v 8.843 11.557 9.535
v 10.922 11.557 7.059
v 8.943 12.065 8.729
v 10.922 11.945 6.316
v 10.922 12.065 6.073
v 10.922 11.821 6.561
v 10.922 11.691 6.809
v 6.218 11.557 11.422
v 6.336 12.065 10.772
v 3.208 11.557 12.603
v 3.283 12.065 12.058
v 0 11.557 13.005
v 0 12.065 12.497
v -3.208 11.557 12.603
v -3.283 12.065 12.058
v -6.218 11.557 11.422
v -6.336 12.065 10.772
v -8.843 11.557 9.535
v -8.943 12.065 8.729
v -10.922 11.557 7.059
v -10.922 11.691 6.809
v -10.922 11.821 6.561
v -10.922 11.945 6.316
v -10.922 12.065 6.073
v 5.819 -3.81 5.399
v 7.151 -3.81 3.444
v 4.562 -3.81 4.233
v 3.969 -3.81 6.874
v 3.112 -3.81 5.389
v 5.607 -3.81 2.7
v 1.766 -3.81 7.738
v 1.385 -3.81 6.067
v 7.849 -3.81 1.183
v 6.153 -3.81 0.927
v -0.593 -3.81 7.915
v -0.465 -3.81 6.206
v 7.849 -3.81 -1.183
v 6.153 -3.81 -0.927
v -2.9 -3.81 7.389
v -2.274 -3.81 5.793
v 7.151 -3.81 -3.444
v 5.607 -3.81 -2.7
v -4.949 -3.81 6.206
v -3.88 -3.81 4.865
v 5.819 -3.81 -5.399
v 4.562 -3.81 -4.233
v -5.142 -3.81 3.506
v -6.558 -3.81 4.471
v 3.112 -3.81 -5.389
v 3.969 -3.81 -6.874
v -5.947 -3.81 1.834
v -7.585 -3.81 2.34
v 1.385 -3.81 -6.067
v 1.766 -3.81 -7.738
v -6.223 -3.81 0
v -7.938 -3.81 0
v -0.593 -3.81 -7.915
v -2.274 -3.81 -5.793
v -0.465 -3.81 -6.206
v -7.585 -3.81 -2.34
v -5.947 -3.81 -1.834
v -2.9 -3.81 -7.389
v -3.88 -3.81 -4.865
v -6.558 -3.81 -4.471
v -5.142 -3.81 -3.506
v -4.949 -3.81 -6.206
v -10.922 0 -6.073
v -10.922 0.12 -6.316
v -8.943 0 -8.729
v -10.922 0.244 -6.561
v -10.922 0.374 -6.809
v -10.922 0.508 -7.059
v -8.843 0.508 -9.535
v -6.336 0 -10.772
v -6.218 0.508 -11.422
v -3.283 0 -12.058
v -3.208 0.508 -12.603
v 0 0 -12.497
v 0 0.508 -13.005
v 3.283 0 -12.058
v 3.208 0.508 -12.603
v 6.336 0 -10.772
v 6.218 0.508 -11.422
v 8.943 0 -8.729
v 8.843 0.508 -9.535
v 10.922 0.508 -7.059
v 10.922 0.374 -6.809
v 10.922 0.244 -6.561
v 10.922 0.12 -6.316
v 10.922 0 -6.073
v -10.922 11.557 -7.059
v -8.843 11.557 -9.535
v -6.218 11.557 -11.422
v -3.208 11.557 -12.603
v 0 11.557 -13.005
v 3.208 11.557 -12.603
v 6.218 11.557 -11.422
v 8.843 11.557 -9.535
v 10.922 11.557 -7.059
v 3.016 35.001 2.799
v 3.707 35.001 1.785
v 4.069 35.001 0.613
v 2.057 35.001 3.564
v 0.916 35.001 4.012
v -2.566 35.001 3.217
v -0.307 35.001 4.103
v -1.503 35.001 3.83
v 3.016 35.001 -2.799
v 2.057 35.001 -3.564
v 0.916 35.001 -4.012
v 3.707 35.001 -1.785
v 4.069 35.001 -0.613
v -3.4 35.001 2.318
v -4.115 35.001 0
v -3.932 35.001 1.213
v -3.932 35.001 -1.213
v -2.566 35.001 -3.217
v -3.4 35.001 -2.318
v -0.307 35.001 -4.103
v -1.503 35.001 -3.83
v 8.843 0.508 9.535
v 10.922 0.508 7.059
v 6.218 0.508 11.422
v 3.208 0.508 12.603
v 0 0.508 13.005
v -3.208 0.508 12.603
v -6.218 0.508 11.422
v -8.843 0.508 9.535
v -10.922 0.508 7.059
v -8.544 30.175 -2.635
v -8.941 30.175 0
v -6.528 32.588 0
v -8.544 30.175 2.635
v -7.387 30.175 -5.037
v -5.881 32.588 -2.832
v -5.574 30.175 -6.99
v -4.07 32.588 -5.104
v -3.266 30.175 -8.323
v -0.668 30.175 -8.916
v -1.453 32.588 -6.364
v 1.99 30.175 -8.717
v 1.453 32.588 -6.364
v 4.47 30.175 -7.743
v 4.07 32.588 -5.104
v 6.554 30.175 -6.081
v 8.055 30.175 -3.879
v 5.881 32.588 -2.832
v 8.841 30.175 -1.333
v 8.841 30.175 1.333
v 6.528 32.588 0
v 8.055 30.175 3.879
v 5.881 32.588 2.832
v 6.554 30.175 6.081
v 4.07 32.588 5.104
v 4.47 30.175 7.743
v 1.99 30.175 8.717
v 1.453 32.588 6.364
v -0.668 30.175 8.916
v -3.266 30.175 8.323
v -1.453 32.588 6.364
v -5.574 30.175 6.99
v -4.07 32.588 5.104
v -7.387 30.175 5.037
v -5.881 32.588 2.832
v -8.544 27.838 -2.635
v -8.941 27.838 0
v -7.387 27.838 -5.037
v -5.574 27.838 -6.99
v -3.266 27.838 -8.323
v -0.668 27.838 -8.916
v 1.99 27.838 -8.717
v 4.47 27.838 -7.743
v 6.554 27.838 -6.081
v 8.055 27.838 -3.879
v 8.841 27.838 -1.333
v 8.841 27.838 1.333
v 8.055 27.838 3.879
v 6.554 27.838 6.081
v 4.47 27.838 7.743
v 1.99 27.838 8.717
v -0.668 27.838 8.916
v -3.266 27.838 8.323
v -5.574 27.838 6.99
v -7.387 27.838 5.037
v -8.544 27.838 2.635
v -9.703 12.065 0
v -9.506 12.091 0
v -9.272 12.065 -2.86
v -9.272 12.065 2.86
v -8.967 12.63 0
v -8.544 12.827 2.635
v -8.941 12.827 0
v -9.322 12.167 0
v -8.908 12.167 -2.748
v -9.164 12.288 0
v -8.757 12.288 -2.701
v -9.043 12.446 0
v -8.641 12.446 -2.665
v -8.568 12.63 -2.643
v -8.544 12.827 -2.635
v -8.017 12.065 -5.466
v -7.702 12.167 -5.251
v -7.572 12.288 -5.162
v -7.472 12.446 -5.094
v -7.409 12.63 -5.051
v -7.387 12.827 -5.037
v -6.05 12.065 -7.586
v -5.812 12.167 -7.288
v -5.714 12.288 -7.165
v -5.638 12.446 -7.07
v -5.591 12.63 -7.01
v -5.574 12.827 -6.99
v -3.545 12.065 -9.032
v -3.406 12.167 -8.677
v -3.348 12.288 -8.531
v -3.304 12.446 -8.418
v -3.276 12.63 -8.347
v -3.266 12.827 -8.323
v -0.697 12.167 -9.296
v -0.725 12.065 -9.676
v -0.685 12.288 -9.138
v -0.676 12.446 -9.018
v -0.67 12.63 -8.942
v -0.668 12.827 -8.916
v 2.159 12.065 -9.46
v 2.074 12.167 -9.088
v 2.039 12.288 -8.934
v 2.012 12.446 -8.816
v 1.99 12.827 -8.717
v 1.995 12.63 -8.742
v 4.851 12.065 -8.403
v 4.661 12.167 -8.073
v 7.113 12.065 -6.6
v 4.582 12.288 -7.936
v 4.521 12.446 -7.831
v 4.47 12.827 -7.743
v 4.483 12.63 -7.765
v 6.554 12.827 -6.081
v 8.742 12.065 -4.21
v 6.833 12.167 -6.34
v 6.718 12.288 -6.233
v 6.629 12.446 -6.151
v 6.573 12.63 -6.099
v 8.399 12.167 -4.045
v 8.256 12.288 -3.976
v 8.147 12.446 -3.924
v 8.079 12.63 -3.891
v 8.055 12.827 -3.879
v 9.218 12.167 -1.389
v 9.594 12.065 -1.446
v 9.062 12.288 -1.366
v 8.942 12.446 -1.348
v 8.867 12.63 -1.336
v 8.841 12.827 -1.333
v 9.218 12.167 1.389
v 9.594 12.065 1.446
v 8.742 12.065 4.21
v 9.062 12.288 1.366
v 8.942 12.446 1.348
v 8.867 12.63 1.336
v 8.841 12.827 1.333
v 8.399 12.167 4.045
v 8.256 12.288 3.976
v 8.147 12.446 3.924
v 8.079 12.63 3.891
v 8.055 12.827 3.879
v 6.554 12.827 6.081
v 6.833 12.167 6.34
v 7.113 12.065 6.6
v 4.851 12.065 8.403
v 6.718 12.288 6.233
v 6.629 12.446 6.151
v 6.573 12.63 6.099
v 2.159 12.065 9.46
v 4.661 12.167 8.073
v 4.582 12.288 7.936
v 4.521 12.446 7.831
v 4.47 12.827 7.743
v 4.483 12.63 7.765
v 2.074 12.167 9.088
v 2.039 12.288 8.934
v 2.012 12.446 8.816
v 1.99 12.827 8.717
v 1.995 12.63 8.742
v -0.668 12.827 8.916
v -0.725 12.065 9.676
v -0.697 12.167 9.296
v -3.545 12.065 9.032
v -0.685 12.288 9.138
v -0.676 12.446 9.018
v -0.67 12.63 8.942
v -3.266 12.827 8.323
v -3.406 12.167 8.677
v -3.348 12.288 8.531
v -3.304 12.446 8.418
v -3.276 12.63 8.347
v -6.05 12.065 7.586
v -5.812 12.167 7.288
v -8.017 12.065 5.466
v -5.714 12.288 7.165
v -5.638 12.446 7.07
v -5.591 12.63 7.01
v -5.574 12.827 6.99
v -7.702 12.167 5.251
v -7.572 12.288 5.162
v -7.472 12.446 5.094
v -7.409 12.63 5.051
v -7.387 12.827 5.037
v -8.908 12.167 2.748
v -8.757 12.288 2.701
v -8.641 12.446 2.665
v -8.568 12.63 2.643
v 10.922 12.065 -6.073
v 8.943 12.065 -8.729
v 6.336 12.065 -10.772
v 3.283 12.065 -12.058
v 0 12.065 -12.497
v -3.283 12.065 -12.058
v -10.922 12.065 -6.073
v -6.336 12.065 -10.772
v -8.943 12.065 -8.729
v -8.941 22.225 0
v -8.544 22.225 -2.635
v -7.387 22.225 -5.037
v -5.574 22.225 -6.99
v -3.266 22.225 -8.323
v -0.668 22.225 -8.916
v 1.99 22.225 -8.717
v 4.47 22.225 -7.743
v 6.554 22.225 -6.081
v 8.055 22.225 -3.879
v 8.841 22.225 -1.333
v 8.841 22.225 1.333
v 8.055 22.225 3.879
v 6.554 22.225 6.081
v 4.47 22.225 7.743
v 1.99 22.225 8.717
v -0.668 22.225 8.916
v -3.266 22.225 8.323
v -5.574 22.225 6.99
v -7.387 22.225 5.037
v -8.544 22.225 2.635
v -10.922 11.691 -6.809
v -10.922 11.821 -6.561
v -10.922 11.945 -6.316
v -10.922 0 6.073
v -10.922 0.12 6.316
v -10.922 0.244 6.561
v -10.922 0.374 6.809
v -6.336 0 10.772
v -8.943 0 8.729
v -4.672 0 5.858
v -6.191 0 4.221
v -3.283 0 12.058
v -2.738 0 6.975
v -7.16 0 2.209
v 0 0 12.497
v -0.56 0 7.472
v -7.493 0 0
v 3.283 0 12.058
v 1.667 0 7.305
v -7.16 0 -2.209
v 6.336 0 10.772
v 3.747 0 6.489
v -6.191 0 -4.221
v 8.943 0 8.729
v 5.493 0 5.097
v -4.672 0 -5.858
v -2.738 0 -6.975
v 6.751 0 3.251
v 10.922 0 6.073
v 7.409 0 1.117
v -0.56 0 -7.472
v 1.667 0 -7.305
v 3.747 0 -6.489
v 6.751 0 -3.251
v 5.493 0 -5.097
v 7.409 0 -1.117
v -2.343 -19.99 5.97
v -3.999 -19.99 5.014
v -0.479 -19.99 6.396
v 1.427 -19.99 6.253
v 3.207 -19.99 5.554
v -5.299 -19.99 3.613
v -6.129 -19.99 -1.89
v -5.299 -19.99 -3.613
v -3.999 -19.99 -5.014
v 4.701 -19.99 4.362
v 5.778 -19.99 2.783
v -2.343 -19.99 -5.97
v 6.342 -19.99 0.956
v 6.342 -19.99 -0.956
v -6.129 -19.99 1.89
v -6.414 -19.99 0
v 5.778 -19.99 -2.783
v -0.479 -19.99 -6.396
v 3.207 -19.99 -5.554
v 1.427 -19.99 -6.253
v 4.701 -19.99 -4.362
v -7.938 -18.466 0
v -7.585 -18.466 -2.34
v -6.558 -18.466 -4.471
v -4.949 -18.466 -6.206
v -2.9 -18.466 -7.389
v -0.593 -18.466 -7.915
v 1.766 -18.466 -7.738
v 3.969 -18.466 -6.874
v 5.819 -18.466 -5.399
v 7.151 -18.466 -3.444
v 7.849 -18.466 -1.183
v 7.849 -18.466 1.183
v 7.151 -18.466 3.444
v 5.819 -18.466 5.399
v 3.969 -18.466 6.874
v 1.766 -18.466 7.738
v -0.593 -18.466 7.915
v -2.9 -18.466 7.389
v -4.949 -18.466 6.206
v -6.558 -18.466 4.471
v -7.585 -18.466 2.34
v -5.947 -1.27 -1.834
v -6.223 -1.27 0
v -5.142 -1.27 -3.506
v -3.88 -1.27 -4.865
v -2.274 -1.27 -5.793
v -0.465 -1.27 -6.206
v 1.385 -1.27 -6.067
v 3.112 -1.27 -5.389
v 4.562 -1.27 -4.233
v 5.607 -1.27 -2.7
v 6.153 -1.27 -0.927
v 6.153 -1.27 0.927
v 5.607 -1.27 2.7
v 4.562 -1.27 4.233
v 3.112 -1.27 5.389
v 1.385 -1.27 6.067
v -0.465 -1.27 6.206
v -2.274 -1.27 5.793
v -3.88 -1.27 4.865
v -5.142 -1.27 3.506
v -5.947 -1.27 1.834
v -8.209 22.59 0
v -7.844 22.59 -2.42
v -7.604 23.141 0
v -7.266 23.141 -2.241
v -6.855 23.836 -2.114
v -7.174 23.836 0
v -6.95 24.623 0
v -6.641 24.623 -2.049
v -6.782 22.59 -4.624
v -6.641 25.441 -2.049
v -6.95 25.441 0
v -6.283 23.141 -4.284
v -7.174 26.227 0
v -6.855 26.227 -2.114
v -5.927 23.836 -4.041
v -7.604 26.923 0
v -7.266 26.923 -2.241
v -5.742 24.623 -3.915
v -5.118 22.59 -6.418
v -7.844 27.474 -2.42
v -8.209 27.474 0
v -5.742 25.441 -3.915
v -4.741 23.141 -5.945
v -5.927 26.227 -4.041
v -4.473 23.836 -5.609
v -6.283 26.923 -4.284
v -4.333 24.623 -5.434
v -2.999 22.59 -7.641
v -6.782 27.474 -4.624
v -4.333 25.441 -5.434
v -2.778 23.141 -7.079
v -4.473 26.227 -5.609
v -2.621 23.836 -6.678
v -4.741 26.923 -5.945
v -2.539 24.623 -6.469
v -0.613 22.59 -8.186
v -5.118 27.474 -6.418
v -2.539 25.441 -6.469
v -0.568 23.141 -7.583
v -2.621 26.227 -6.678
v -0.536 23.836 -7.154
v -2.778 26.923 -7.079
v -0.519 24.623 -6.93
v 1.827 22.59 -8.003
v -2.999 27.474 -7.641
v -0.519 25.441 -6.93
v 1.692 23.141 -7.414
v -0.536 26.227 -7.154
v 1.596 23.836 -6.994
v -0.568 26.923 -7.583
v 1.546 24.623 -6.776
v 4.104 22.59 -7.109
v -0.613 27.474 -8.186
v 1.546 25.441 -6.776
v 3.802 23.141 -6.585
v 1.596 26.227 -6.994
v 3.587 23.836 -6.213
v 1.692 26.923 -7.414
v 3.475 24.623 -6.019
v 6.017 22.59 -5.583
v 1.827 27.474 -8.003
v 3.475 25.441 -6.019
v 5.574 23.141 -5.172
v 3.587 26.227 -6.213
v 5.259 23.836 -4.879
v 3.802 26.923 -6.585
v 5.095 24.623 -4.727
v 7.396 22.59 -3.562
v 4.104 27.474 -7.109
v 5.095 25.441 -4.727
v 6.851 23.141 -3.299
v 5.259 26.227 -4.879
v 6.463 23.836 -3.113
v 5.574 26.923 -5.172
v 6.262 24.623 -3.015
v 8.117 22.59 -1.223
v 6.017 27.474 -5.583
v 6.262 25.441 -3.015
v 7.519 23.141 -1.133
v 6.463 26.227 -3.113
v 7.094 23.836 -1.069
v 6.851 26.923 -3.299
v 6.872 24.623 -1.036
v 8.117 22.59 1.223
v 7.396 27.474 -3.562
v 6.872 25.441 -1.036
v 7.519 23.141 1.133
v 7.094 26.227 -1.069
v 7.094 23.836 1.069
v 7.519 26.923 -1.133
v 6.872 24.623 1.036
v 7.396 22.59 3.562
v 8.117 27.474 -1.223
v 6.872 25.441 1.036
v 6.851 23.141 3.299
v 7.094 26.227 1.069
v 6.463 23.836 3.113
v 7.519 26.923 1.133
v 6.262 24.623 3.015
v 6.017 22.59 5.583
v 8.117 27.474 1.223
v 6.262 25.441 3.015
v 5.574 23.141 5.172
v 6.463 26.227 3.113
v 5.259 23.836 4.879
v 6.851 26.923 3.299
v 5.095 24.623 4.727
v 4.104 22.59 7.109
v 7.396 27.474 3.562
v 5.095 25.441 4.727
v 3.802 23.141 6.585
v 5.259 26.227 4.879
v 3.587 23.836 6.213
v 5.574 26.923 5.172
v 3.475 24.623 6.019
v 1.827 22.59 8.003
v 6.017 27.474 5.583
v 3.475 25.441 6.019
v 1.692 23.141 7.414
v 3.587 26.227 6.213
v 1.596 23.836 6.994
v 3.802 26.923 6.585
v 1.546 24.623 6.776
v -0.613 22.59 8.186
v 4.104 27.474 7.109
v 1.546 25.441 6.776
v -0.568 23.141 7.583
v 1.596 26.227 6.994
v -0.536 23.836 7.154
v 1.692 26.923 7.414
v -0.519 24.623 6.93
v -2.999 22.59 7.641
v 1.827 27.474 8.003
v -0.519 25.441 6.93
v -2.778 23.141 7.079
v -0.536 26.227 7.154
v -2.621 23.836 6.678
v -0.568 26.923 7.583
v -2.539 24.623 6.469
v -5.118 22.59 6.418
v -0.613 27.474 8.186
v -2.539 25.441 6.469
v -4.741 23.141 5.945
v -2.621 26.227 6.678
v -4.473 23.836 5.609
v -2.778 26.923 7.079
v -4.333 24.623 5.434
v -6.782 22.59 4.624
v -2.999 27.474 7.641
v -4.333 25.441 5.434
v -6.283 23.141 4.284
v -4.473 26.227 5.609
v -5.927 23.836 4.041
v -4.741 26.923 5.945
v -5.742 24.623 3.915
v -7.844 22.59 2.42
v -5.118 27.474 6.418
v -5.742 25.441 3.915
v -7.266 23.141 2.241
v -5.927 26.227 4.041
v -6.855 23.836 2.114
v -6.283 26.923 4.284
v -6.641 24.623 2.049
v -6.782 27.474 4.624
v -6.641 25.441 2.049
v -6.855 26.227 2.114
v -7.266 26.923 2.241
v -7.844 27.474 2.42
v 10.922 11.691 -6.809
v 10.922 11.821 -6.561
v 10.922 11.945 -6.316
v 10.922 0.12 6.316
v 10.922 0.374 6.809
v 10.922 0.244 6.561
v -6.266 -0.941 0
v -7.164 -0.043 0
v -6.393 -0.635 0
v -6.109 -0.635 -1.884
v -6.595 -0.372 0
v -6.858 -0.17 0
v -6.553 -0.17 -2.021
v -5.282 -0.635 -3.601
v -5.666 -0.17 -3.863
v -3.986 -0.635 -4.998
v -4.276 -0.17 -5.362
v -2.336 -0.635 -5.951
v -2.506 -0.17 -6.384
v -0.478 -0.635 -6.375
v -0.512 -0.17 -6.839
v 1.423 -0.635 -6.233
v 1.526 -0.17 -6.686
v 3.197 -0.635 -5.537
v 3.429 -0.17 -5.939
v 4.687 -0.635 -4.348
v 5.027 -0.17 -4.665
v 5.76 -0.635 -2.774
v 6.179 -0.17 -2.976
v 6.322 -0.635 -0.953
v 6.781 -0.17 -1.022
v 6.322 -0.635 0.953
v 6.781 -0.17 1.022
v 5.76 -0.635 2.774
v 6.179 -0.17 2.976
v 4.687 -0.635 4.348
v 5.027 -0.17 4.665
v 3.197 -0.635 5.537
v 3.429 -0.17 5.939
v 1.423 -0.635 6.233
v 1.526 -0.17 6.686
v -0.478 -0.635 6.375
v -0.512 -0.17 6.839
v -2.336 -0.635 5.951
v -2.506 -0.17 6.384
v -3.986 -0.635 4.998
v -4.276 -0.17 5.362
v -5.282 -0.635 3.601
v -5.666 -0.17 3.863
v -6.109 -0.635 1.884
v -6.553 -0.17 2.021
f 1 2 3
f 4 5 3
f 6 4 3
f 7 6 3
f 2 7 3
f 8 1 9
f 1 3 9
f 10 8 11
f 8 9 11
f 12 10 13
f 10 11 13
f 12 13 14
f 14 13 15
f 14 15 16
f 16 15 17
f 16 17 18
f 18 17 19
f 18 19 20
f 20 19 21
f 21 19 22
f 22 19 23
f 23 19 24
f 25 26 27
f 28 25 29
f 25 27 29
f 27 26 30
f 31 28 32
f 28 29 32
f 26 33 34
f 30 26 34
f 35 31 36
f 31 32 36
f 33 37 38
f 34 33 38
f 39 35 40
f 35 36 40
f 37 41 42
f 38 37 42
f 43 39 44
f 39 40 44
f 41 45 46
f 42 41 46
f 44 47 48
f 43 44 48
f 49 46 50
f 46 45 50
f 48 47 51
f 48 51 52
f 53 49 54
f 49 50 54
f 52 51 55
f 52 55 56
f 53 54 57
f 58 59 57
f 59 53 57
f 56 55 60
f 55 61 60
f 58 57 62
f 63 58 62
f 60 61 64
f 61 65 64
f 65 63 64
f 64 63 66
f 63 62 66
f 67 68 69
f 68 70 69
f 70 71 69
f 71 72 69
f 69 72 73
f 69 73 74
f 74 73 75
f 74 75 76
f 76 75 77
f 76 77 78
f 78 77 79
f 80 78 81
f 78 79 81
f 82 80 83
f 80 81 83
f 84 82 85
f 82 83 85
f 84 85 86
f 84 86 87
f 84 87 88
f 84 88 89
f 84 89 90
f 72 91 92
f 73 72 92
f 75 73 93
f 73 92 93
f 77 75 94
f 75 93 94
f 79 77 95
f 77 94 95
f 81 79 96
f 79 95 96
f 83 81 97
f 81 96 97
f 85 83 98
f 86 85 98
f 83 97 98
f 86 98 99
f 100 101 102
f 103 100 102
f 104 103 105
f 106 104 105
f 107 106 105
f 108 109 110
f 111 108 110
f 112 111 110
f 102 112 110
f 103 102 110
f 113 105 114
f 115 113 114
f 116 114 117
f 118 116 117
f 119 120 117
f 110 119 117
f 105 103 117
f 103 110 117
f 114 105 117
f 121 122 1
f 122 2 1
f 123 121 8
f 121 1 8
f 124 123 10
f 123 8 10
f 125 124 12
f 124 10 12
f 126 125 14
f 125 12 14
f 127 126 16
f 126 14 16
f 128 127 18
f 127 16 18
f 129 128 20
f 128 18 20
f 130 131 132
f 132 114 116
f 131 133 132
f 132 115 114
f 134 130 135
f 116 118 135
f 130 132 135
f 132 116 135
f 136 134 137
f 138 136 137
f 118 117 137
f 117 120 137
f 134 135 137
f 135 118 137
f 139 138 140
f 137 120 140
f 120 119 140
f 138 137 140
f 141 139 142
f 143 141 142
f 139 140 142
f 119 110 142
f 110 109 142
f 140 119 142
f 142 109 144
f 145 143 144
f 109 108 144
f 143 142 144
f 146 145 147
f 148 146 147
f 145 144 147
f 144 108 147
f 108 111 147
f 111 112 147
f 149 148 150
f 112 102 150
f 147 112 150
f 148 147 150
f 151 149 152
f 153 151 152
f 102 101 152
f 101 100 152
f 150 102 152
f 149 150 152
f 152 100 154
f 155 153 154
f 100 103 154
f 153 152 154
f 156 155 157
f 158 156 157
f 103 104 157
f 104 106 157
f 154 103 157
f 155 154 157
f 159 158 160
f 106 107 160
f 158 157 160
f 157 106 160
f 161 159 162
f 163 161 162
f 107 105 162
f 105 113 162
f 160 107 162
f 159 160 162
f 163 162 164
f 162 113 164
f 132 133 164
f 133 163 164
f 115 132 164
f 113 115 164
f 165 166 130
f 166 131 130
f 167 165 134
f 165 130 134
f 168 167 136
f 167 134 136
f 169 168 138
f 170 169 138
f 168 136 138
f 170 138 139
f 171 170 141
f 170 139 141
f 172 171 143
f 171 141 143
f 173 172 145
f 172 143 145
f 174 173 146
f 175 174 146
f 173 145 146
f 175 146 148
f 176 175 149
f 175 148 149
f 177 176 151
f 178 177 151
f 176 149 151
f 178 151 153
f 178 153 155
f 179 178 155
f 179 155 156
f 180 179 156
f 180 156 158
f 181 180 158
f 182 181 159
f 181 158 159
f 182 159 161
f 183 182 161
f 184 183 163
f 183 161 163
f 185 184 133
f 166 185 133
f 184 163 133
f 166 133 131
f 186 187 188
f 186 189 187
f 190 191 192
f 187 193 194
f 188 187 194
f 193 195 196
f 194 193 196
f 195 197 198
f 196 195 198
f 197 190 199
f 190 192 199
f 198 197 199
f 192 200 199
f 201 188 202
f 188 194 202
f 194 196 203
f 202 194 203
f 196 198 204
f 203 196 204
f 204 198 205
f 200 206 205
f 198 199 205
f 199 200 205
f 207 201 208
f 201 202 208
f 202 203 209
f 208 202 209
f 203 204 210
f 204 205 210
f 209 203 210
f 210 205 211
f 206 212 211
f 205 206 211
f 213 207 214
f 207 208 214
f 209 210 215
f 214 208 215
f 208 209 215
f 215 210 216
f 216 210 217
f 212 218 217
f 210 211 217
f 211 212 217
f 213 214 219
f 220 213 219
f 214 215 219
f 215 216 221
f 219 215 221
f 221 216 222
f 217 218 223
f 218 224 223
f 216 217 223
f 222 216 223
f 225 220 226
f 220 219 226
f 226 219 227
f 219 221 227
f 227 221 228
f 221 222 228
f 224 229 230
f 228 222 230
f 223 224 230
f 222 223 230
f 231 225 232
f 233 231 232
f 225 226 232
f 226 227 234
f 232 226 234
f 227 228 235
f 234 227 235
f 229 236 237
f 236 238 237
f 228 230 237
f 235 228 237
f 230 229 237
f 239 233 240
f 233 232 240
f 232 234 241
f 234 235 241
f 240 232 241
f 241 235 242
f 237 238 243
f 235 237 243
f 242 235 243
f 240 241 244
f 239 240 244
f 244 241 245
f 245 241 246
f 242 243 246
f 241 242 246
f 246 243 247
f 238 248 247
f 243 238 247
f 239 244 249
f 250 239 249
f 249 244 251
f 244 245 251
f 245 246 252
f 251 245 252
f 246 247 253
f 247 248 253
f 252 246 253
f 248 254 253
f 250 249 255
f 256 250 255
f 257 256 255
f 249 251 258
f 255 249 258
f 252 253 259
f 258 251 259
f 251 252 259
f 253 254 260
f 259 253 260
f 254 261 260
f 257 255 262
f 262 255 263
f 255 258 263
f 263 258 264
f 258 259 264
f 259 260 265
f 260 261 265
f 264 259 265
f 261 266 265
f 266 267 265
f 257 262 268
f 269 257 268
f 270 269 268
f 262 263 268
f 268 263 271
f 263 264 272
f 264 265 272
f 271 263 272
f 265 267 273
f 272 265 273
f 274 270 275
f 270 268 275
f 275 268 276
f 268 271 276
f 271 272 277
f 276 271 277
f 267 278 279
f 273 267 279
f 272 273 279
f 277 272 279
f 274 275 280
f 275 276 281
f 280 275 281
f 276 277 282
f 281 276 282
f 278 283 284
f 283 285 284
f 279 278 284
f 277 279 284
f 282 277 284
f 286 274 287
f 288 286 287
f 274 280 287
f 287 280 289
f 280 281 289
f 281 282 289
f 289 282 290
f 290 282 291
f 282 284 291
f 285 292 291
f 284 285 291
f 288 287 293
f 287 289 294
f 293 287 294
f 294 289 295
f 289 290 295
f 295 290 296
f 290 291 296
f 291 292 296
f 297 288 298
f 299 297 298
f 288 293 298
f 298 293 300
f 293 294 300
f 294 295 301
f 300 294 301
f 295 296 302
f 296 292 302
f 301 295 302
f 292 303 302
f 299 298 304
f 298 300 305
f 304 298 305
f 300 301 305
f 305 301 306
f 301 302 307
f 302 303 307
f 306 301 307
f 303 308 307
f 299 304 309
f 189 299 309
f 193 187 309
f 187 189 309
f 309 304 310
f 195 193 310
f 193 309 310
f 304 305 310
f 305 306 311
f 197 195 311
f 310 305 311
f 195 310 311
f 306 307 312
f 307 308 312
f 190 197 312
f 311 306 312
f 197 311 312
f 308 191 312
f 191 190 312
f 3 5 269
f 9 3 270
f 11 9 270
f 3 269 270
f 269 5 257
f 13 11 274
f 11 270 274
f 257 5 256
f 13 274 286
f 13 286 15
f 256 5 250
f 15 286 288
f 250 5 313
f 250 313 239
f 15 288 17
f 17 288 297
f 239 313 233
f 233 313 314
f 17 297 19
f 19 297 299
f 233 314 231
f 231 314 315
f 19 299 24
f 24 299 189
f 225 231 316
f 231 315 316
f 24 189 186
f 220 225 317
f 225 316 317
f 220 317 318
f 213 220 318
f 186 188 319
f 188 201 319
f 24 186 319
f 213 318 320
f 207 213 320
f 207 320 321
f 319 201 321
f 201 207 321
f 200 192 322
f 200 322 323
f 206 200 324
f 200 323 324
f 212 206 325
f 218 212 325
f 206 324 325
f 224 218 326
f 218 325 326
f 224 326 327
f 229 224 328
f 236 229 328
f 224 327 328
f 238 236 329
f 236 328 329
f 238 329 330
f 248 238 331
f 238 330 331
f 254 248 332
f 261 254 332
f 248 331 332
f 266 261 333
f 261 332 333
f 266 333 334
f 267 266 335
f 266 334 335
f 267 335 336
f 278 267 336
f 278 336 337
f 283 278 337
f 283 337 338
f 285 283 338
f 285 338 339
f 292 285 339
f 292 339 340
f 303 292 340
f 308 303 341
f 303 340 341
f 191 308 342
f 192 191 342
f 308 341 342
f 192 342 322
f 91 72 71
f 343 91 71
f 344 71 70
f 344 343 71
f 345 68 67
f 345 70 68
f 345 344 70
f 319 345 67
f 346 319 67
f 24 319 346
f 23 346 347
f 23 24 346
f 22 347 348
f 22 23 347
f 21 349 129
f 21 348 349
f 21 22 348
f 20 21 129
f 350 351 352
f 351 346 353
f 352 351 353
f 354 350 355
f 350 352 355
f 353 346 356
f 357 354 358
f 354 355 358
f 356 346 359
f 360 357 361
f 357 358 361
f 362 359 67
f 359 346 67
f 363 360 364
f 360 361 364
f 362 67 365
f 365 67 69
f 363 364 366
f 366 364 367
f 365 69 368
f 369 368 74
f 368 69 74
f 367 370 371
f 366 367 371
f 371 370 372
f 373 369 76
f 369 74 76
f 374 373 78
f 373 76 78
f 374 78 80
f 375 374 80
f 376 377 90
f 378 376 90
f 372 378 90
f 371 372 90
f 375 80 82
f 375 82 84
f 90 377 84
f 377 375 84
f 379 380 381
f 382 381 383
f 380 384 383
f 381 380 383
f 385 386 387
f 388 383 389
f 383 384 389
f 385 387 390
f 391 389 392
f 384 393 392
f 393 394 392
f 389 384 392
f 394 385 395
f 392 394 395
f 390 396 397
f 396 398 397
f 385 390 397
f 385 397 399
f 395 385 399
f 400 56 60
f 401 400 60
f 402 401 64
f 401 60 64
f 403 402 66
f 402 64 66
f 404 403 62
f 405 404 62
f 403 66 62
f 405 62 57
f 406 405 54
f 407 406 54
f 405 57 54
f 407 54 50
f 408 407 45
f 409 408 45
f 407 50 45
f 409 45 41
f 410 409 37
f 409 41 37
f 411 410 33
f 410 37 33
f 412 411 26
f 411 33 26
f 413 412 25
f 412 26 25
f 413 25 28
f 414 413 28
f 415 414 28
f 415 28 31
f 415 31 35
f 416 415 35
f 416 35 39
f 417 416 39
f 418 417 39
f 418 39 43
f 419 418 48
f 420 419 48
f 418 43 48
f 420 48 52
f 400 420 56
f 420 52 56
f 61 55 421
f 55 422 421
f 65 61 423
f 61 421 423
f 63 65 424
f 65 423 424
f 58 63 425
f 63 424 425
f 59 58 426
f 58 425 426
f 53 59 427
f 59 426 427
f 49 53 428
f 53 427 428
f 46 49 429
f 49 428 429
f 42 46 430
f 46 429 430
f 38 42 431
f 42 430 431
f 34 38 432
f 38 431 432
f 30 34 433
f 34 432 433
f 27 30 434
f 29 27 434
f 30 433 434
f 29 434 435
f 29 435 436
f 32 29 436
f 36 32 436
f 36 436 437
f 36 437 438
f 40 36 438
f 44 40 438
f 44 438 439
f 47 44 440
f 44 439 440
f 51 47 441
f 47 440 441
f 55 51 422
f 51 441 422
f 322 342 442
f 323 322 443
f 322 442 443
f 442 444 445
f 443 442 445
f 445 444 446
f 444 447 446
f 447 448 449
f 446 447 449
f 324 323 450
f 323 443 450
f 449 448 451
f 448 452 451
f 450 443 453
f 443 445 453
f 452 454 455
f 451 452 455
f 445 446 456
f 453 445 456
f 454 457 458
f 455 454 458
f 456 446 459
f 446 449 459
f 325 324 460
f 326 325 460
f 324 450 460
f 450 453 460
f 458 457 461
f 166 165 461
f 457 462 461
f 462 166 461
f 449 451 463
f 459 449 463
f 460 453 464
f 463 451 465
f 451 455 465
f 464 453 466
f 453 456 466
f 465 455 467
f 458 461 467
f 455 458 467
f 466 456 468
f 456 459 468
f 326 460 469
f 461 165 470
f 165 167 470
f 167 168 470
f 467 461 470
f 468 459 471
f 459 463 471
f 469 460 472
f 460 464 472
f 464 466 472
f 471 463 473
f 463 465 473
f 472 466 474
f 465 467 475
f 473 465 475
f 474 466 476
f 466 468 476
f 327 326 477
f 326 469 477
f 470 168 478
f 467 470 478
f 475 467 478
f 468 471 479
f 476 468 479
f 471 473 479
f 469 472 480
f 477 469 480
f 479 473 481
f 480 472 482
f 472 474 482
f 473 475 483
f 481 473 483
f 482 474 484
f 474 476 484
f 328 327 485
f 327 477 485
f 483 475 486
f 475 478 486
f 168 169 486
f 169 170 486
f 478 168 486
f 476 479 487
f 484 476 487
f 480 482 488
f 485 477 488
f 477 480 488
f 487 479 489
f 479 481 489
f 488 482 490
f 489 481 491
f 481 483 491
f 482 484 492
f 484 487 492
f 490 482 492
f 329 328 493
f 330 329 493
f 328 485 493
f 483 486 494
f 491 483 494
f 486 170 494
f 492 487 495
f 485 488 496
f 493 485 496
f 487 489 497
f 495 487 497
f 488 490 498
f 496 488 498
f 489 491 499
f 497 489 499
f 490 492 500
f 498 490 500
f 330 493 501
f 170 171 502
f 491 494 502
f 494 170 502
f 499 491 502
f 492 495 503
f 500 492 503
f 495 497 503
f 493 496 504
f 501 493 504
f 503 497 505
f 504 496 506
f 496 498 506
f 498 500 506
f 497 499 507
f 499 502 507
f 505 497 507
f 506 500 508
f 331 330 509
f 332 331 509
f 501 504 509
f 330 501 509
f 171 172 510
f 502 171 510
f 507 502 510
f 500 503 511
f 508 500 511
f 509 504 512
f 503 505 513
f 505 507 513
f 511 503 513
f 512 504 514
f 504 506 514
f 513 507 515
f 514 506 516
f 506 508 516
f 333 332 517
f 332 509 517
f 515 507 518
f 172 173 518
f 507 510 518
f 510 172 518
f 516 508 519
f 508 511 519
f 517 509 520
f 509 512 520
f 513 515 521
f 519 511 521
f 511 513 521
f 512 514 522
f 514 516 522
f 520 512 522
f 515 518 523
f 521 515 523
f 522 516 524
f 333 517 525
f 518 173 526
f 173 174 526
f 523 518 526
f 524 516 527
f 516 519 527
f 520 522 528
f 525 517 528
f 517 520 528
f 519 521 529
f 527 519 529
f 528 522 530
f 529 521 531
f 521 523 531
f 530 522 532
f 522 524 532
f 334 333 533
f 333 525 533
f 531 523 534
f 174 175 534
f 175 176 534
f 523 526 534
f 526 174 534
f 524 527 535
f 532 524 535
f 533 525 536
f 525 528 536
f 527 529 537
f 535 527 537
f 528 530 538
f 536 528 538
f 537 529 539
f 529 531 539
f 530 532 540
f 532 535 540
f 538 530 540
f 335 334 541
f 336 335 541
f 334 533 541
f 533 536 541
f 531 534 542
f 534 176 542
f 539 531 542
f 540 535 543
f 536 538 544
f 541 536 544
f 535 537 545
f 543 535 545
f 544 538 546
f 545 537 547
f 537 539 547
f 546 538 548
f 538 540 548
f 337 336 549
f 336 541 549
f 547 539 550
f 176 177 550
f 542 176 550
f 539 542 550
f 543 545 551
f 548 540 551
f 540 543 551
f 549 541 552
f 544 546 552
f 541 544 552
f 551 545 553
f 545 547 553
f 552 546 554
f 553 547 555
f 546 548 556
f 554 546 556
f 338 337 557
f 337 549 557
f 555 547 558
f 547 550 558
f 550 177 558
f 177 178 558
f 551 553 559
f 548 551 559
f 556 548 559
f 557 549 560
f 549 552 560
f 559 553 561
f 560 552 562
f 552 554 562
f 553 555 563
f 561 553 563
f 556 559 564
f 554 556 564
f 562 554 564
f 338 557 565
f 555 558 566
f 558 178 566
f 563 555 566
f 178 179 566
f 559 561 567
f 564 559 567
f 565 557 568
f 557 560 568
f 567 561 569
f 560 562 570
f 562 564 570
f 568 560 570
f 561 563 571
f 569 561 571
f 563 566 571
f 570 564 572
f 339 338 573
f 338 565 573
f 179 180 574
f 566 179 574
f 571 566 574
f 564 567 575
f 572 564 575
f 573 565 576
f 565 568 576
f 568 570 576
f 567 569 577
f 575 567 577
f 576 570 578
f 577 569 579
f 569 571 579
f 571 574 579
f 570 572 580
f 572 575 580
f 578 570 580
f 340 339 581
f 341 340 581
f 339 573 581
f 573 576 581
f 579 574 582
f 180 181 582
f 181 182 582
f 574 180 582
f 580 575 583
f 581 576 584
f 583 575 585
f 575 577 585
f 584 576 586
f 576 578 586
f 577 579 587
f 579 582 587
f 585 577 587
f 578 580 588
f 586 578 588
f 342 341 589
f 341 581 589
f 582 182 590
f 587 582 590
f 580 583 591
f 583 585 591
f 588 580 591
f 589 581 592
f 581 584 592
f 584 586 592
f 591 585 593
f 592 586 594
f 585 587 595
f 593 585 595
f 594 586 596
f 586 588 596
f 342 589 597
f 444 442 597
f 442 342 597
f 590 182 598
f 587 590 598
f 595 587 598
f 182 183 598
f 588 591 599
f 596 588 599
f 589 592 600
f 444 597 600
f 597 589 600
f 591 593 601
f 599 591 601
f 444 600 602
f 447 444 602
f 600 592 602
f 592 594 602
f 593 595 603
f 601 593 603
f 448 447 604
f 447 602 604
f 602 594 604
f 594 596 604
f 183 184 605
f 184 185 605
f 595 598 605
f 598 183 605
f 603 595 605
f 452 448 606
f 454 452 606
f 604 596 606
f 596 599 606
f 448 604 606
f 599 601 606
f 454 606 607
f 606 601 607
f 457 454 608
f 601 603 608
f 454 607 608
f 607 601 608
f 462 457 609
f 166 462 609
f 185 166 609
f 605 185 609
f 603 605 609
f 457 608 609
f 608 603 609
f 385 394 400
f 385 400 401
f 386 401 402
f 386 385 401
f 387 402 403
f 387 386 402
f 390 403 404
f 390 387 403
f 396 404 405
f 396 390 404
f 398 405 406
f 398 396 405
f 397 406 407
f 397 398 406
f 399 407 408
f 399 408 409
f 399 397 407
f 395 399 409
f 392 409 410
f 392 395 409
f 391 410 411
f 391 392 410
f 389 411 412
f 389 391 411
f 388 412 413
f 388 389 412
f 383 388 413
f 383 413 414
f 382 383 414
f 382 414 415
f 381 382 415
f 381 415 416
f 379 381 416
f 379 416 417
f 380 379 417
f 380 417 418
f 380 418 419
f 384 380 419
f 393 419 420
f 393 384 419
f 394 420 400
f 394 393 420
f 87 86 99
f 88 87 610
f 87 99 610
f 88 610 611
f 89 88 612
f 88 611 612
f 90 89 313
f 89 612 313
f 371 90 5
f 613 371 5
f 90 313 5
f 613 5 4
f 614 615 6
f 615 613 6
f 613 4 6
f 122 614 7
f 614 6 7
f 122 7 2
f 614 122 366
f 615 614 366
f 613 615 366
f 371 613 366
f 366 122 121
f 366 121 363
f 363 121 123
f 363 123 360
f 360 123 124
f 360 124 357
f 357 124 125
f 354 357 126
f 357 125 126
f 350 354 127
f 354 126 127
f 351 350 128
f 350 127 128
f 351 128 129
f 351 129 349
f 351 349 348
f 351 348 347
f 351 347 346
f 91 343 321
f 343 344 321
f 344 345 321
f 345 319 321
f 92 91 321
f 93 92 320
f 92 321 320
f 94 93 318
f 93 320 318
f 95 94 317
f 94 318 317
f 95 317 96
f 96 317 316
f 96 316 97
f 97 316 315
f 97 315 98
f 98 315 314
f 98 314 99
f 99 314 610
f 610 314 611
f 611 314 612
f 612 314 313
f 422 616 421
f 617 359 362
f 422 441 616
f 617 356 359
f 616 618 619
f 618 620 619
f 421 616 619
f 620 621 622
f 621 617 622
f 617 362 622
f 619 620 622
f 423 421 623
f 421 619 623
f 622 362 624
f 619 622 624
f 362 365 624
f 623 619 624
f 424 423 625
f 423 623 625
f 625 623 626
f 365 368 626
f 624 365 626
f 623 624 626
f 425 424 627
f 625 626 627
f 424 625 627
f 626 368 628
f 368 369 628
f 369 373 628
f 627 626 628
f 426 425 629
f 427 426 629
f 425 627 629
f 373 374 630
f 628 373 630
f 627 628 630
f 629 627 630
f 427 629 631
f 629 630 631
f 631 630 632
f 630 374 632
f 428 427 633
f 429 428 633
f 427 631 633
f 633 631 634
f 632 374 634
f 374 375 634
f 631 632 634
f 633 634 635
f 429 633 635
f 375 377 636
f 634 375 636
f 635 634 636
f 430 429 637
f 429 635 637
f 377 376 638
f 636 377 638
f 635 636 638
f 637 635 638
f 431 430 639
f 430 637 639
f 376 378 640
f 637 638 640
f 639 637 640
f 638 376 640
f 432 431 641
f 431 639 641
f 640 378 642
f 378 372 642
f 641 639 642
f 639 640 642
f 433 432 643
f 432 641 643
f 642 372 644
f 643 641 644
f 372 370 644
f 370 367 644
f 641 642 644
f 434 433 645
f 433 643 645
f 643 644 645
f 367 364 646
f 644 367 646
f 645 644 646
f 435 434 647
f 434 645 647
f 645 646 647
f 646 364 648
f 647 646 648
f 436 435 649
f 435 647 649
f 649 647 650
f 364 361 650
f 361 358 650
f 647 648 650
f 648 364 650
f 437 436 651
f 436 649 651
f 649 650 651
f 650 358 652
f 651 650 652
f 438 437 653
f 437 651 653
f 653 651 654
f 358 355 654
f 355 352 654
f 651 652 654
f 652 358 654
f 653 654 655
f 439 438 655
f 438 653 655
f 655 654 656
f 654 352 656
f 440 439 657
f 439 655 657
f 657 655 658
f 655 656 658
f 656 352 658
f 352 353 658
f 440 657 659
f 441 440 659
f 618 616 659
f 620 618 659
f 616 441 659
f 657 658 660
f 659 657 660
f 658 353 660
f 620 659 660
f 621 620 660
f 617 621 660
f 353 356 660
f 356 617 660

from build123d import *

# Parameters (mm, degrees)
CHAMFER1_SIZE      = 0.508
CHAMFER2_SIZE      = 1.524
CUT_EXTRUDE1_DEPTH = 33.0548
FILLET1_R          = 0.762


with BuildPart() as part:
    # Sketch1 → Revolve1 (revolve)
    with BuildSketch(Plane.XY):
        with BuildLine():
            Line((0, 35.0012), (0, -19.9898))
            Line((0, -19.9898), (-7.9375, -19.9898))
            Line((-7.9375, -19.9898), (-7.9375, -3.81))
            Line((-7.9375, -3.81), (-6.223, -3.81))
            Line((-6.223, -3.81), (-6.223, -1.27))
            ThreePointArc((-6.223, -1.27), (-6.594974388, -0.371974388), (-7.493, 0))
            Line((-7.493, 0), (-13.0048, 0))
            Line((-13.0048, 0), (-13.0048, 12.065))
            Line((-13.0048, 12.065), (-8.9408, 12.065))
            Line((-8.9408, 12.065), (-8.9408, 22.225))
            ThreePointArc((-8.9408, 22.225), (-6.9215, 25.0317), (-8.9408, 27.8384))
            Line((-8.9408, 27.8384), (-8.9408, 30.1752))
            Line((-8.9408, 30.1752), (-4.1148, 35.0012))
            Line((-4.1148, 35.0012), (0, 35.0012))
        make_face()
    revolve(axis=Axis((0, -19.9898, 0), (0, -1, 0)))

    # Chamfer1
    chamfer1_edges = [part.edges().sort_by_distance(p)[0] for p in [
        (13.0048, 12.065, 0),
        (13.0048, 0, 0),
    ]]
    chamfer(chamfer1_edges, length=CHAMFER1_SIZE)

    # Chamfer2
    chamfer2_edges = [part.edges().sort_by_distance(p)[0] for p in [
        (7.9375, -19.9898, 0),
    ]]
    chamfer(chamfer2_edges, length=CHAMFER2_SIZE)

    # Sketch2 → Cut-Extrude1 (cut, through all)
    with BuildSketch(Plane(origin=(0, 12.065, 0), x_dir=(1, 0, 0), z_dir=(0, 1, 0))):
        with BuildLine():
            Line((-10.922, 7.059372425), (-10.922, -7.059372425))
            ThreePointArc((-10.922, -7.059372425), (-13.0048, 0), (-10.922, 7.059372425))
        make_face()
        with BuildLine():
            Line((10.922, 7.059372425), (10.922, -7.059372425))
            ThreePointArc((10.922, -7.059372425), (13.0048, 0), (10.922, 7.059372425))
        make_face()
    extrude(amount=-CUT_EXTRUDE1_DEPTH, mode=Mode.SUBTRACT)

    # Fillet1
    fillet1_edges = [part.edges().sort_by_distance(p)[0] for p in [
        (8.9408, 12.065, 0),
    ]]
    fillet(fillet1_edges, radius=FILLET1_R)


solid = part.part
